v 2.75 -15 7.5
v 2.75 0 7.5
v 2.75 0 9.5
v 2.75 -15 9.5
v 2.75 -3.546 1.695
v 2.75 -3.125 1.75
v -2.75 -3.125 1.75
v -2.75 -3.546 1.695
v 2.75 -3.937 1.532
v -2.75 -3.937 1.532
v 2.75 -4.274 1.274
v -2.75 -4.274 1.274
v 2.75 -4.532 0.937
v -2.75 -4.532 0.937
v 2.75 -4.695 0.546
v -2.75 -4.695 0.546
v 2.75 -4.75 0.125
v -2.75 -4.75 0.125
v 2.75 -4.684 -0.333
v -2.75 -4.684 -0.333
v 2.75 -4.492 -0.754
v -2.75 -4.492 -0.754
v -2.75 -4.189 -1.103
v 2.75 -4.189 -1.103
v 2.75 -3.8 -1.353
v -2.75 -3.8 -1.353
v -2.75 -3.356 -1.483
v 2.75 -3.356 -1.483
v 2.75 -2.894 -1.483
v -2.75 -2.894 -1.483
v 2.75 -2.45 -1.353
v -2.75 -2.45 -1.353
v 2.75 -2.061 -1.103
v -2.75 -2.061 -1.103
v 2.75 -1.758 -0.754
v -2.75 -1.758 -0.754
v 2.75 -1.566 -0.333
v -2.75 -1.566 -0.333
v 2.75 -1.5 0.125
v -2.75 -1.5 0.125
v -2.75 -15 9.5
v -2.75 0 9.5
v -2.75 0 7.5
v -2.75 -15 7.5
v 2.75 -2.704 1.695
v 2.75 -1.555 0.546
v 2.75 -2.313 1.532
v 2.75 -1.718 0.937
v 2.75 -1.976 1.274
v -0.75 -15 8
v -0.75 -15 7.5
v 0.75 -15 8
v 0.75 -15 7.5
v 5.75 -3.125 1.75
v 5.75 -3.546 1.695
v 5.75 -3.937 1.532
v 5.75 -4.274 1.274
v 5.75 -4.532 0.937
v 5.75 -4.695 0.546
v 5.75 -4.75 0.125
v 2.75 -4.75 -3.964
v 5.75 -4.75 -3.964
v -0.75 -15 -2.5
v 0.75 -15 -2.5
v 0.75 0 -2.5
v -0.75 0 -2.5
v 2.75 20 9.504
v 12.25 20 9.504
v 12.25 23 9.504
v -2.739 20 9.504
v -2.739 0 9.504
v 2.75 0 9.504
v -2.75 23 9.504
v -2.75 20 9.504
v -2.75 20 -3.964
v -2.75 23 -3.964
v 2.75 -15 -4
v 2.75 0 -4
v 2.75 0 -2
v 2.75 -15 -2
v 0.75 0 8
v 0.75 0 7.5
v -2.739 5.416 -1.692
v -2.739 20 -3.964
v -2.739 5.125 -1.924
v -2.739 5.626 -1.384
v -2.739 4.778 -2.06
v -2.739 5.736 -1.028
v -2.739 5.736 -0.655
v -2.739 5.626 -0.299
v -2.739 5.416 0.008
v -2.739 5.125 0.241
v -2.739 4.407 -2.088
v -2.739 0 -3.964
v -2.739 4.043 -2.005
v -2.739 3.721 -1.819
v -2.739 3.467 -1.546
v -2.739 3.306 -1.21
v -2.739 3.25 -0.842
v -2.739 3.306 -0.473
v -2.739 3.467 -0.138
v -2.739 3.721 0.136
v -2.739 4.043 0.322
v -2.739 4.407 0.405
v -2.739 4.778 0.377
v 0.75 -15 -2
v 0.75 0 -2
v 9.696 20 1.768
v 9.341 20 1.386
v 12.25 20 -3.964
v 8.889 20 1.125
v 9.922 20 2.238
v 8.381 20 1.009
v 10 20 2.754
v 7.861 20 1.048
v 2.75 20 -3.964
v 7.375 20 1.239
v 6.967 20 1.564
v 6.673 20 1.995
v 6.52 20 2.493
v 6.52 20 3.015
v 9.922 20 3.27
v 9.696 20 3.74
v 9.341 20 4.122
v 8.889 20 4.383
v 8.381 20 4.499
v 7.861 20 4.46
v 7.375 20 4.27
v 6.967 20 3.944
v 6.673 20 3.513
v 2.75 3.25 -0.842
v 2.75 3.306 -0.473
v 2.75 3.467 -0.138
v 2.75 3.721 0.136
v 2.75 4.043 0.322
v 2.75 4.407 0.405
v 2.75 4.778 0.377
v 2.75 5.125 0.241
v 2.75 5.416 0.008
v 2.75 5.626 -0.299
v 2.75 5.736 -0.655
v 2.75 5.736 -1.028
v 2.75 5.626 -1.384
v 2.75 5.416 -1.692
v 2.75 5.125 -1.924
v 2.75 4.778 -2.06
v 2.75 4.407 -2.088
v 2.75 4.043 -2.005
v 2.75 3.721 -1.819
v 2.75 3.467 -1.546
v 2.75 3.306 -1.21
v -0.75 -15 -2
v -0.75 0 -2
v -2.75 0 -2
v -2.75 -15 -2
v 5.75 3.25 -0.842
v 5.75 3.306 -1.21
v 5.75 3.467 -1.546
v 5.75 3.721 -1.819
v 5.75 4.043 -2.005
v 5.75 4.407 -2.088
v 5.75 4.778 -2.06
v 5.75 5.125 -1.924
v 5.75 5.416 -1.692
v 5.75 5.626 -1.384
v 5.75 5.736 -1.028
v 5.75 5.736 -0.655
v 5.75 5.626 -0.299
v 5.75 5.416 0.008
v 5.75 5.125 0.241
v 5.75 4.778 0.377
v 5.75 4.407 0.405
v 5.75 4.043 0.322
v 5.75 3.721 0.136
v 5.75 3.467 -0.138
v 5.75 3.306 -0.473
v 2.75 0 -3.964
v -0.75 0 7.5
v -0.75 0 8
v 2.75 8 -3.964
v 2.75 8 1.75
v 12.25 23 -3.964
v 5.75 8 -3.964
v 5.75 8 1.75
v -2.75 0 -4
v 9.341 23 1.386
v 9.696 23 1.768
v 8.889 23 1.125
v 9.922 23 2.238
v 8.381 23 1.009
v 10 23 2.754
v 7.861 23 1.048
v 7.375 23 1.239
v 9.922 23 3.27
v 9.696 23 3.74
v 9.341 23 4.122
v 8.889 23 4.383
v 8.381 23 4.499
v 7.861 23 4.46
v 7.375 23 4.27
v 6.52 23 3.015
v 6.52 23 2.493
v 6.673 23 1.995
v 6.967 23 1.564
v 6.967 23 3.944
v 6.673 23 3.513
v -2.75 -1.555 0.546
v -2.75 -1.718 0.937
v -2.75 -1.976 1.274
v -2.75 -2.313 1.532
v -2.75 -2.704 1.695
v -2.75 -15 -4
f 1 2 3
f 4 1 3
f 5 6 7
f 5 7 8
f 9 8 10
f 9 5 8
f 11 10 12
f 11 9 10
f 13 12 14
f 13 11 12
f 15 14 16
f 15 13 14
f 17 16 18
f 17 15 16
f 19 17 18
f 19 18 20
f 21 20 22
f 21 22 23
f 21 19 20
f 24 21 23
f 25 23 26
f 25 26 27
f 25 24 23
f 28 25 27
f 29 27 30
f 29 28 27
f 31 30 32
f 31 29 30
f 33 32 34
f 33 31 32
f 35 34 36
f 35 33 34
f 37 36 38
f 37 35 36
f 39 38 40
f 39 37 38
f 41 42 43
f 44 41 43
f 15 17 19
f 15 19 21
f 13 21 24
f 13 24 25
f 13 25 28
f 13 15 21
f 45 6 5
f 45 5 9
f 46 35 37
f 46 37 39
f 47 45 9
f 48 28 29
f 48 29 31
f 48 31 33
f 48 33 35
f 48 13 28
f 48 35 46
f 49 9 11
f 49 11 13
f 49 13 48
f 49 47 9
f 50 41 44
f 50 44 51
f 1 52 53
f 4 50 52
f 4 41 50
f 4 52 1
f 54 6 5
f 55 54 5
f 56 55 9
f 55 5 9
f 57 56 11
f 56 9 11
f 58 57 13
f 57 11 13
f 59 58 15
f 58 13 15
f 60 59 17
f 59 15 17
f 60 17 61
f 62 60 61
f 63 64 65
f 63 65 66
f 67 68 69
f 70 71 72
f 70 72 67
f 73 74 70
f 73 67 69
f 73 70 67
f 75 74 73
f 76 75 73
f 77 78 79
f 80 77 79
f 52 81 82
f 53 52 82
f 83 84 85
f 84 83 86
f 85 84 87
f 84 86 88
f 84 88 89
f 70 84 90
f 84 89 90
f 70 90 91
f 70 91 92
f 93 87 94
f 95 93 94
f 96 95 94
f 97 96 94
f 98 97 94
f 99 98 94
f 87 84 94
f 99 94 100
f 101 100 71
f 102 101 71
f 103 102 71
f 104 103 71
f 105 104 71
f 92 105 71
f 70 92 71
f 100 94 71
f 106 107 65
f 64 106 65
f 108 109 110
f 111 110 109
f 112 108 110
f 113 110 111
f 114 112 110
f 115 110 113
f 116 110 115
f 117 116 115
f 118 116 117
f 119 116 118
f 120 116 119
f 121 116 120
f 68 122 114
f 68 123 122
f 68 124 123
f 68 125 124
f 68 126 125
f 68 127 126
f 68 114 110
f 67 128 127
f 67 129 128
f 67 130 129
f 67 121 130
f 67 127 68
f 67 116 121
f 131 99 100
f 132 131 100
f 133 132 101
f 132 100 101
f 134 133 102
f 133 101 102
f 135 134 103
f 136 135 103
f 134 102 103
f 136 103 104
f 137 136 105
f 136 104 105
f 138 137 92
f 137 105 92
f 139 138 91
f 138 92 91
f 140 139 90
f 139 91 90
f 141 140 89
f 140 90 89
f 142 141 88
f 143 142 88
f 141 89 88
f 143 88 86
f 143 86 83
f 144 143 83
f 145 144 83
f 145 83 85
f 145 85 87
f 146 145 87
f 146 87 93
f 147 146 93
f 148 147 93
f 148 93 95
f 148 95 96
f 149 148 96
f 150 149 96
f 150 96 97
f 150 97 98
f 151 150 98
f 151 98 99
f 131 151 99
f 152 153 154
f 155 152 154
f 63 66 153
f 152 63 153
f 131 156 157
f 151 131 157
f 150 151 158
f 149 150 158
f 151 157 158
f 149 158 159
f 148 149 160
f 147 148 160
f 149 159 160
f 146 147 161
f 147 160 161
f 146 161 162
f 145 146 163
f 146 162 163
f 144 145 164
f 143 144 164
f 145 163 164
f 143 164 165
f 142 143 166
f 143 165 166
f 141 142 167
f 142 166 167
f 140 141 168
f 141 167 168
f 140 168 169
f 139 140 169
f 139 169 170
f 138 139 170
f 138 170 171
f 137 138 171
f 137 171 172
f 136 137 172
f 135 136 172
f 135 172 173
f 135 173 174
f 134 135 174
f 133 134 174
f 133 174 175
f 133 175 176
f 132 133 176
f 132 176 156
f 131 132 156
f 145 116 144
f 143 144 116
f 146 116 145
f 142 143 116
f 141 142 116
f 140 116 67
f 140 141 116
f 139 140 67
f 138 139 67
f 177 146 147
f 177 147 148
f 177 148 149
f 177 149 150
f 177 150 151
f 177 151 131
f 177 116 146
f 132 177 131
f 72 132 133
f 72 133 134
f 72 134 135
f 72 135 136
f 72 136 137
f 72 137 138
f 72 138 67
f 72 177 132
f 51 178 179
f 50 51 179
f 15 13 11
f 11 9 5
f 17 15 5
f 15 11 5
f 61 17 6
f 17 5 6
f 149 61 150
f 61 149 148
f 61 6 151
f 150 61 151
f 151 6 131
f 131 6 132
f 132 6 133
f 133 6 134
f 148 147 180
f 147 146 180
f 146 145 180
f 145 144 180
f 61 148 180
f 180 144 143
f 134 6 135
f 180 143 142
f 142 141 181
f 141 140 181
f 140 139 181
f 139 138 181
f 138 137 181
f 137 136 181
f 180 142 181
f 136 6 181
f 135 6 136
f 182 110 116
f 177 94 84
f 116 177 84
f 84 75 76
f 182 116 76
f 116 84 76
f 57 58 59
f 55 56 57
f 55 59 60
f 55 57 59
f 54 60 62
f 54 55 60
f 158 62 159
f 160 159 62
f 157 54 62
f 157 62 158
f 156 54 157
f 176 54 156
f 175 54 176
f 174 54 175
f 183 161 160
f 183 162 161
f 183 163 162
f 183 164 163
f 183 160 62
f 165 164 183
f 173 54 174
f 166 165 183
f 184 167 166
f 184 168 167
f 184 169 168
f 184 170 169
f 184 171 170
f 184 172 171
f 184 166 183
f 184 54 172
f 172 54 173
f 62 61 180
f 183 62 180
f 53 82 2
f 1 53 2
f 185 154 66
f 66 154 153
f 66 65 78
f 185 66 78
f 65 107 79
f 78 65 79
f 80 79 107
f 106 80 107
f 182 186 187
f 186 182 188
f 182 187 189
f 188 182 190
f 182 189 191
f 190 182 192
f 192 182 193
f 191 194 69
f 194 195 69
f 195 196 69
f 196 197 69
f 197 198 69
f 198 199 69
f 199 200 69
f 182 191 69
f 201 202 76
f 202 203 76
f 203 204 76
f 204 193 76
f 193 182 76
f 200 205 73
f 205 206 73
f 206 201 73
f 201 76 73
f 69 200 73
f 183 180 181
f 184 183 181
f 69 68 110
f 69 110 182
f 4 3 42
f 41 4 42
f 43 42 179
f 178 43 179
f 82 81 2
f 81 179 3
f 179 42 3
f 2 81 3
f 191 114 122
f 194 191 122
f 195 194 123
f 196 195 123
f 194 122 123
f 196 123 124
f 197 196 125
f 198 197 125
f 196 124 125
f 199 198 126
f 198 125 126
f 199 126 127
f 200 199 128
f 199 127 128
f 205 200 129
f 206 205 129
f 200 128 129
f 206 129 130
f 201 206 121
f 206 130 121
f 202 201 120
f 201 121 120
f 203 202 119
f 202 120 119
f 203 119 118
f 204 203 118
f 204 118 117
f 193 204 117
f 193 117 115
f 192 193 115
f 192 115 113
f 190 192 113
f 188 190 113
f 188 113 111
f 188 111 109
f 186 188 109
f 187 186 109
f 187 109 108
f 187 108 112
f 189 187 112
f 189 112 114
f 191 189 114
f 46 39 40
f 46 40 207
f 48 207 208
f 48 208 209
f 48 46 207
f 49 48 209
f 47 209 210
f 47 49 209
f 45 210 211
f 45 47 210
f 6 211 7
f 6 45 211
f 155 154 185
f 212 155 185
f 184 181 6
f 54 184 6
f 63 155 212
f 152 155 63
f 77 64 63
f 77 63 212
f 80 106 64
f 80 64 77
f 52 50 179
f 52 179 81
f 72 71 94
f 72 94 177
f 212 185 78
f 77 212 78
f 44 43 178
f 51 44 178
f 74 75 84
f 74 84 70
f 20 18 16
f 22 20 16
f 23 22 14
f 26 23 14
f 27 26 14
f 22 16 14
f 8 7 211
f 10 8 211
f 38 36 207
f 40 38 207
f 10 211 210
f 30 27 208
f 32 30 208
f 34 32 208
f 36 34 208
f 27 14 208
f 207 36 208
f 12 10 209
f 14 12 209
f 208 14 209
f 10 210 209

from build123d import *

# Parameters (mm, degrees)
F2_DEPTH  = 15
F3_W      = 5.4890122265
F3_H      = 13.4684094228
F4_DEPTH  = 20
F6_D      = 2.5
F7_DEPTH  = 5.5
F8_DEPTH  = 3
F9_D      = 2.5
F11_W     = 3
F11_H     = 13.4684094228
F12_DEPTH = 15
F15_D     = 3.5


with BuildPart() as f2:
    # F1 (on Front) → F2 (new body)
    with BuildSketch(Plane.XZ):
        Polygon((-0.75, 7.5), (-0.75, 8), (0.75, 8), (0.75, 7.5), (2.75, 7.5), (2.75, 9.5), (-2.75, 9.5), (-2.75, 7.5), align=None)
    extrude(amount=F2_DEPTH)


with BuildPart() as f2b:
    # F1 (on Front) → F2, piece 2 (new body)
    with BuildSketch(Plane.XZ):
        Polygon((0.75, -2), (0.75, -2.5), (-0.75, -2.5), (-0.75, -2), (-2.75, -2), (-2.75, -4), (2.75, -4), (2.75, -2), align=None)
    extrude(amount=F2_DEPTH)


with BuildPart() as f4:
    # F3 (on Front) → F4 (new body)
    with BuildSketch(Plane.XZ):
        with Locations((0.0054938868, 2.7699188795)):
            Rectangle(F3_W, F3_H)
    extrude(amount=-F4_DEPTH)

    # F6 (through all)
    with Locations(Plane.YZ.offset(2.75)):
        with Locations((4.5, -0.8417858319)):
            Hole(F6_D / 2)

    # F11 (on offset) → F12 (join)
    with BuildSketch(Plane.YZ.offset(-2.75)):
        with Locations((21.5, 2.7699188795)):
            Rectangle(F11_W, F11_H)
    extrude(amount=F12_DEPTH)

    # F15 (through all)
    with Locations(Plane(origin=(0, 23, 0), x_dir=(-1, 0, 0), z_dir=(0, 1, 0))):
        with Locations((-8.25, 2.7541235909)):
            Hole(F15_D / 2)


with BuildPart() as f7:
    # F5 (on offset) → F7 (new body)
    with BuildSketch(Plane.YZ.offset(2.75)):
        with BuildLine():
            ThreePointArc((-4.75, 0.125), (-3.125, -1.5), (-1.5, 0.125))
            ThreePointArc((-1.5, 0.125), (-1.9759514806, 1.2740485194), (-3.125, 1.75))
            ThreePointArc((-3.125, 1.75), (-4.2740485194, 1.2740485194), (-4.75, 0.125))
        make_face()
    extrude(amount=-F7_DEPTH)


with BuildPart() as f8:
    # F5 (on offset) → F8 (new body)
    with BuildSketch(Plane.YZ.offset(2.75)):
        with BuildLine():
            ThreePointArc((-4.75, 0.125), (-3.125, -1.5), (-1.5, 0.125))
            ThreePointArc((-1.5, 0.125), (-1.9759514806, 1.2740485194), (-3.125, 1.75))
            ThreePointArc((-3.125, 1.75), (-4.2740485194, 1.2740485194), (-4.75, 0.125))
        make_face()
        with BuildLine():
            ThreePointArc((-3.125, 1.75), (-1.9759514806, 1.2740485194), (-1.5, 0.125))
            ThreePointArc((-1.5, 0.125), (-3.125, -1.5), (-4.75, 0.125))
            Line((-4.75, 0.125), (-4.75, -3.9642858319))
            Line((-4.75, -3.9642858319), (8, -3.9642858319))
            Line((8, -3.9642858319), (8, 1.75))
            Line((8, 1.75), (-3.125, 1.75))
        make_face()
    extrude(amount=F8_DEPTH)

    # F9 (through all)
    with Locations(Plane(origin=(2.75, 0, 0), x_dir=(0, 1, 0), z_dir=(-1, 0, 0))):
        with Locations((4.5, 0.8417858319)):
            Hole(F9_D / 2)


solid = Compound([f2.part, f2b.part, f4.part, f7.part, f8.part])
